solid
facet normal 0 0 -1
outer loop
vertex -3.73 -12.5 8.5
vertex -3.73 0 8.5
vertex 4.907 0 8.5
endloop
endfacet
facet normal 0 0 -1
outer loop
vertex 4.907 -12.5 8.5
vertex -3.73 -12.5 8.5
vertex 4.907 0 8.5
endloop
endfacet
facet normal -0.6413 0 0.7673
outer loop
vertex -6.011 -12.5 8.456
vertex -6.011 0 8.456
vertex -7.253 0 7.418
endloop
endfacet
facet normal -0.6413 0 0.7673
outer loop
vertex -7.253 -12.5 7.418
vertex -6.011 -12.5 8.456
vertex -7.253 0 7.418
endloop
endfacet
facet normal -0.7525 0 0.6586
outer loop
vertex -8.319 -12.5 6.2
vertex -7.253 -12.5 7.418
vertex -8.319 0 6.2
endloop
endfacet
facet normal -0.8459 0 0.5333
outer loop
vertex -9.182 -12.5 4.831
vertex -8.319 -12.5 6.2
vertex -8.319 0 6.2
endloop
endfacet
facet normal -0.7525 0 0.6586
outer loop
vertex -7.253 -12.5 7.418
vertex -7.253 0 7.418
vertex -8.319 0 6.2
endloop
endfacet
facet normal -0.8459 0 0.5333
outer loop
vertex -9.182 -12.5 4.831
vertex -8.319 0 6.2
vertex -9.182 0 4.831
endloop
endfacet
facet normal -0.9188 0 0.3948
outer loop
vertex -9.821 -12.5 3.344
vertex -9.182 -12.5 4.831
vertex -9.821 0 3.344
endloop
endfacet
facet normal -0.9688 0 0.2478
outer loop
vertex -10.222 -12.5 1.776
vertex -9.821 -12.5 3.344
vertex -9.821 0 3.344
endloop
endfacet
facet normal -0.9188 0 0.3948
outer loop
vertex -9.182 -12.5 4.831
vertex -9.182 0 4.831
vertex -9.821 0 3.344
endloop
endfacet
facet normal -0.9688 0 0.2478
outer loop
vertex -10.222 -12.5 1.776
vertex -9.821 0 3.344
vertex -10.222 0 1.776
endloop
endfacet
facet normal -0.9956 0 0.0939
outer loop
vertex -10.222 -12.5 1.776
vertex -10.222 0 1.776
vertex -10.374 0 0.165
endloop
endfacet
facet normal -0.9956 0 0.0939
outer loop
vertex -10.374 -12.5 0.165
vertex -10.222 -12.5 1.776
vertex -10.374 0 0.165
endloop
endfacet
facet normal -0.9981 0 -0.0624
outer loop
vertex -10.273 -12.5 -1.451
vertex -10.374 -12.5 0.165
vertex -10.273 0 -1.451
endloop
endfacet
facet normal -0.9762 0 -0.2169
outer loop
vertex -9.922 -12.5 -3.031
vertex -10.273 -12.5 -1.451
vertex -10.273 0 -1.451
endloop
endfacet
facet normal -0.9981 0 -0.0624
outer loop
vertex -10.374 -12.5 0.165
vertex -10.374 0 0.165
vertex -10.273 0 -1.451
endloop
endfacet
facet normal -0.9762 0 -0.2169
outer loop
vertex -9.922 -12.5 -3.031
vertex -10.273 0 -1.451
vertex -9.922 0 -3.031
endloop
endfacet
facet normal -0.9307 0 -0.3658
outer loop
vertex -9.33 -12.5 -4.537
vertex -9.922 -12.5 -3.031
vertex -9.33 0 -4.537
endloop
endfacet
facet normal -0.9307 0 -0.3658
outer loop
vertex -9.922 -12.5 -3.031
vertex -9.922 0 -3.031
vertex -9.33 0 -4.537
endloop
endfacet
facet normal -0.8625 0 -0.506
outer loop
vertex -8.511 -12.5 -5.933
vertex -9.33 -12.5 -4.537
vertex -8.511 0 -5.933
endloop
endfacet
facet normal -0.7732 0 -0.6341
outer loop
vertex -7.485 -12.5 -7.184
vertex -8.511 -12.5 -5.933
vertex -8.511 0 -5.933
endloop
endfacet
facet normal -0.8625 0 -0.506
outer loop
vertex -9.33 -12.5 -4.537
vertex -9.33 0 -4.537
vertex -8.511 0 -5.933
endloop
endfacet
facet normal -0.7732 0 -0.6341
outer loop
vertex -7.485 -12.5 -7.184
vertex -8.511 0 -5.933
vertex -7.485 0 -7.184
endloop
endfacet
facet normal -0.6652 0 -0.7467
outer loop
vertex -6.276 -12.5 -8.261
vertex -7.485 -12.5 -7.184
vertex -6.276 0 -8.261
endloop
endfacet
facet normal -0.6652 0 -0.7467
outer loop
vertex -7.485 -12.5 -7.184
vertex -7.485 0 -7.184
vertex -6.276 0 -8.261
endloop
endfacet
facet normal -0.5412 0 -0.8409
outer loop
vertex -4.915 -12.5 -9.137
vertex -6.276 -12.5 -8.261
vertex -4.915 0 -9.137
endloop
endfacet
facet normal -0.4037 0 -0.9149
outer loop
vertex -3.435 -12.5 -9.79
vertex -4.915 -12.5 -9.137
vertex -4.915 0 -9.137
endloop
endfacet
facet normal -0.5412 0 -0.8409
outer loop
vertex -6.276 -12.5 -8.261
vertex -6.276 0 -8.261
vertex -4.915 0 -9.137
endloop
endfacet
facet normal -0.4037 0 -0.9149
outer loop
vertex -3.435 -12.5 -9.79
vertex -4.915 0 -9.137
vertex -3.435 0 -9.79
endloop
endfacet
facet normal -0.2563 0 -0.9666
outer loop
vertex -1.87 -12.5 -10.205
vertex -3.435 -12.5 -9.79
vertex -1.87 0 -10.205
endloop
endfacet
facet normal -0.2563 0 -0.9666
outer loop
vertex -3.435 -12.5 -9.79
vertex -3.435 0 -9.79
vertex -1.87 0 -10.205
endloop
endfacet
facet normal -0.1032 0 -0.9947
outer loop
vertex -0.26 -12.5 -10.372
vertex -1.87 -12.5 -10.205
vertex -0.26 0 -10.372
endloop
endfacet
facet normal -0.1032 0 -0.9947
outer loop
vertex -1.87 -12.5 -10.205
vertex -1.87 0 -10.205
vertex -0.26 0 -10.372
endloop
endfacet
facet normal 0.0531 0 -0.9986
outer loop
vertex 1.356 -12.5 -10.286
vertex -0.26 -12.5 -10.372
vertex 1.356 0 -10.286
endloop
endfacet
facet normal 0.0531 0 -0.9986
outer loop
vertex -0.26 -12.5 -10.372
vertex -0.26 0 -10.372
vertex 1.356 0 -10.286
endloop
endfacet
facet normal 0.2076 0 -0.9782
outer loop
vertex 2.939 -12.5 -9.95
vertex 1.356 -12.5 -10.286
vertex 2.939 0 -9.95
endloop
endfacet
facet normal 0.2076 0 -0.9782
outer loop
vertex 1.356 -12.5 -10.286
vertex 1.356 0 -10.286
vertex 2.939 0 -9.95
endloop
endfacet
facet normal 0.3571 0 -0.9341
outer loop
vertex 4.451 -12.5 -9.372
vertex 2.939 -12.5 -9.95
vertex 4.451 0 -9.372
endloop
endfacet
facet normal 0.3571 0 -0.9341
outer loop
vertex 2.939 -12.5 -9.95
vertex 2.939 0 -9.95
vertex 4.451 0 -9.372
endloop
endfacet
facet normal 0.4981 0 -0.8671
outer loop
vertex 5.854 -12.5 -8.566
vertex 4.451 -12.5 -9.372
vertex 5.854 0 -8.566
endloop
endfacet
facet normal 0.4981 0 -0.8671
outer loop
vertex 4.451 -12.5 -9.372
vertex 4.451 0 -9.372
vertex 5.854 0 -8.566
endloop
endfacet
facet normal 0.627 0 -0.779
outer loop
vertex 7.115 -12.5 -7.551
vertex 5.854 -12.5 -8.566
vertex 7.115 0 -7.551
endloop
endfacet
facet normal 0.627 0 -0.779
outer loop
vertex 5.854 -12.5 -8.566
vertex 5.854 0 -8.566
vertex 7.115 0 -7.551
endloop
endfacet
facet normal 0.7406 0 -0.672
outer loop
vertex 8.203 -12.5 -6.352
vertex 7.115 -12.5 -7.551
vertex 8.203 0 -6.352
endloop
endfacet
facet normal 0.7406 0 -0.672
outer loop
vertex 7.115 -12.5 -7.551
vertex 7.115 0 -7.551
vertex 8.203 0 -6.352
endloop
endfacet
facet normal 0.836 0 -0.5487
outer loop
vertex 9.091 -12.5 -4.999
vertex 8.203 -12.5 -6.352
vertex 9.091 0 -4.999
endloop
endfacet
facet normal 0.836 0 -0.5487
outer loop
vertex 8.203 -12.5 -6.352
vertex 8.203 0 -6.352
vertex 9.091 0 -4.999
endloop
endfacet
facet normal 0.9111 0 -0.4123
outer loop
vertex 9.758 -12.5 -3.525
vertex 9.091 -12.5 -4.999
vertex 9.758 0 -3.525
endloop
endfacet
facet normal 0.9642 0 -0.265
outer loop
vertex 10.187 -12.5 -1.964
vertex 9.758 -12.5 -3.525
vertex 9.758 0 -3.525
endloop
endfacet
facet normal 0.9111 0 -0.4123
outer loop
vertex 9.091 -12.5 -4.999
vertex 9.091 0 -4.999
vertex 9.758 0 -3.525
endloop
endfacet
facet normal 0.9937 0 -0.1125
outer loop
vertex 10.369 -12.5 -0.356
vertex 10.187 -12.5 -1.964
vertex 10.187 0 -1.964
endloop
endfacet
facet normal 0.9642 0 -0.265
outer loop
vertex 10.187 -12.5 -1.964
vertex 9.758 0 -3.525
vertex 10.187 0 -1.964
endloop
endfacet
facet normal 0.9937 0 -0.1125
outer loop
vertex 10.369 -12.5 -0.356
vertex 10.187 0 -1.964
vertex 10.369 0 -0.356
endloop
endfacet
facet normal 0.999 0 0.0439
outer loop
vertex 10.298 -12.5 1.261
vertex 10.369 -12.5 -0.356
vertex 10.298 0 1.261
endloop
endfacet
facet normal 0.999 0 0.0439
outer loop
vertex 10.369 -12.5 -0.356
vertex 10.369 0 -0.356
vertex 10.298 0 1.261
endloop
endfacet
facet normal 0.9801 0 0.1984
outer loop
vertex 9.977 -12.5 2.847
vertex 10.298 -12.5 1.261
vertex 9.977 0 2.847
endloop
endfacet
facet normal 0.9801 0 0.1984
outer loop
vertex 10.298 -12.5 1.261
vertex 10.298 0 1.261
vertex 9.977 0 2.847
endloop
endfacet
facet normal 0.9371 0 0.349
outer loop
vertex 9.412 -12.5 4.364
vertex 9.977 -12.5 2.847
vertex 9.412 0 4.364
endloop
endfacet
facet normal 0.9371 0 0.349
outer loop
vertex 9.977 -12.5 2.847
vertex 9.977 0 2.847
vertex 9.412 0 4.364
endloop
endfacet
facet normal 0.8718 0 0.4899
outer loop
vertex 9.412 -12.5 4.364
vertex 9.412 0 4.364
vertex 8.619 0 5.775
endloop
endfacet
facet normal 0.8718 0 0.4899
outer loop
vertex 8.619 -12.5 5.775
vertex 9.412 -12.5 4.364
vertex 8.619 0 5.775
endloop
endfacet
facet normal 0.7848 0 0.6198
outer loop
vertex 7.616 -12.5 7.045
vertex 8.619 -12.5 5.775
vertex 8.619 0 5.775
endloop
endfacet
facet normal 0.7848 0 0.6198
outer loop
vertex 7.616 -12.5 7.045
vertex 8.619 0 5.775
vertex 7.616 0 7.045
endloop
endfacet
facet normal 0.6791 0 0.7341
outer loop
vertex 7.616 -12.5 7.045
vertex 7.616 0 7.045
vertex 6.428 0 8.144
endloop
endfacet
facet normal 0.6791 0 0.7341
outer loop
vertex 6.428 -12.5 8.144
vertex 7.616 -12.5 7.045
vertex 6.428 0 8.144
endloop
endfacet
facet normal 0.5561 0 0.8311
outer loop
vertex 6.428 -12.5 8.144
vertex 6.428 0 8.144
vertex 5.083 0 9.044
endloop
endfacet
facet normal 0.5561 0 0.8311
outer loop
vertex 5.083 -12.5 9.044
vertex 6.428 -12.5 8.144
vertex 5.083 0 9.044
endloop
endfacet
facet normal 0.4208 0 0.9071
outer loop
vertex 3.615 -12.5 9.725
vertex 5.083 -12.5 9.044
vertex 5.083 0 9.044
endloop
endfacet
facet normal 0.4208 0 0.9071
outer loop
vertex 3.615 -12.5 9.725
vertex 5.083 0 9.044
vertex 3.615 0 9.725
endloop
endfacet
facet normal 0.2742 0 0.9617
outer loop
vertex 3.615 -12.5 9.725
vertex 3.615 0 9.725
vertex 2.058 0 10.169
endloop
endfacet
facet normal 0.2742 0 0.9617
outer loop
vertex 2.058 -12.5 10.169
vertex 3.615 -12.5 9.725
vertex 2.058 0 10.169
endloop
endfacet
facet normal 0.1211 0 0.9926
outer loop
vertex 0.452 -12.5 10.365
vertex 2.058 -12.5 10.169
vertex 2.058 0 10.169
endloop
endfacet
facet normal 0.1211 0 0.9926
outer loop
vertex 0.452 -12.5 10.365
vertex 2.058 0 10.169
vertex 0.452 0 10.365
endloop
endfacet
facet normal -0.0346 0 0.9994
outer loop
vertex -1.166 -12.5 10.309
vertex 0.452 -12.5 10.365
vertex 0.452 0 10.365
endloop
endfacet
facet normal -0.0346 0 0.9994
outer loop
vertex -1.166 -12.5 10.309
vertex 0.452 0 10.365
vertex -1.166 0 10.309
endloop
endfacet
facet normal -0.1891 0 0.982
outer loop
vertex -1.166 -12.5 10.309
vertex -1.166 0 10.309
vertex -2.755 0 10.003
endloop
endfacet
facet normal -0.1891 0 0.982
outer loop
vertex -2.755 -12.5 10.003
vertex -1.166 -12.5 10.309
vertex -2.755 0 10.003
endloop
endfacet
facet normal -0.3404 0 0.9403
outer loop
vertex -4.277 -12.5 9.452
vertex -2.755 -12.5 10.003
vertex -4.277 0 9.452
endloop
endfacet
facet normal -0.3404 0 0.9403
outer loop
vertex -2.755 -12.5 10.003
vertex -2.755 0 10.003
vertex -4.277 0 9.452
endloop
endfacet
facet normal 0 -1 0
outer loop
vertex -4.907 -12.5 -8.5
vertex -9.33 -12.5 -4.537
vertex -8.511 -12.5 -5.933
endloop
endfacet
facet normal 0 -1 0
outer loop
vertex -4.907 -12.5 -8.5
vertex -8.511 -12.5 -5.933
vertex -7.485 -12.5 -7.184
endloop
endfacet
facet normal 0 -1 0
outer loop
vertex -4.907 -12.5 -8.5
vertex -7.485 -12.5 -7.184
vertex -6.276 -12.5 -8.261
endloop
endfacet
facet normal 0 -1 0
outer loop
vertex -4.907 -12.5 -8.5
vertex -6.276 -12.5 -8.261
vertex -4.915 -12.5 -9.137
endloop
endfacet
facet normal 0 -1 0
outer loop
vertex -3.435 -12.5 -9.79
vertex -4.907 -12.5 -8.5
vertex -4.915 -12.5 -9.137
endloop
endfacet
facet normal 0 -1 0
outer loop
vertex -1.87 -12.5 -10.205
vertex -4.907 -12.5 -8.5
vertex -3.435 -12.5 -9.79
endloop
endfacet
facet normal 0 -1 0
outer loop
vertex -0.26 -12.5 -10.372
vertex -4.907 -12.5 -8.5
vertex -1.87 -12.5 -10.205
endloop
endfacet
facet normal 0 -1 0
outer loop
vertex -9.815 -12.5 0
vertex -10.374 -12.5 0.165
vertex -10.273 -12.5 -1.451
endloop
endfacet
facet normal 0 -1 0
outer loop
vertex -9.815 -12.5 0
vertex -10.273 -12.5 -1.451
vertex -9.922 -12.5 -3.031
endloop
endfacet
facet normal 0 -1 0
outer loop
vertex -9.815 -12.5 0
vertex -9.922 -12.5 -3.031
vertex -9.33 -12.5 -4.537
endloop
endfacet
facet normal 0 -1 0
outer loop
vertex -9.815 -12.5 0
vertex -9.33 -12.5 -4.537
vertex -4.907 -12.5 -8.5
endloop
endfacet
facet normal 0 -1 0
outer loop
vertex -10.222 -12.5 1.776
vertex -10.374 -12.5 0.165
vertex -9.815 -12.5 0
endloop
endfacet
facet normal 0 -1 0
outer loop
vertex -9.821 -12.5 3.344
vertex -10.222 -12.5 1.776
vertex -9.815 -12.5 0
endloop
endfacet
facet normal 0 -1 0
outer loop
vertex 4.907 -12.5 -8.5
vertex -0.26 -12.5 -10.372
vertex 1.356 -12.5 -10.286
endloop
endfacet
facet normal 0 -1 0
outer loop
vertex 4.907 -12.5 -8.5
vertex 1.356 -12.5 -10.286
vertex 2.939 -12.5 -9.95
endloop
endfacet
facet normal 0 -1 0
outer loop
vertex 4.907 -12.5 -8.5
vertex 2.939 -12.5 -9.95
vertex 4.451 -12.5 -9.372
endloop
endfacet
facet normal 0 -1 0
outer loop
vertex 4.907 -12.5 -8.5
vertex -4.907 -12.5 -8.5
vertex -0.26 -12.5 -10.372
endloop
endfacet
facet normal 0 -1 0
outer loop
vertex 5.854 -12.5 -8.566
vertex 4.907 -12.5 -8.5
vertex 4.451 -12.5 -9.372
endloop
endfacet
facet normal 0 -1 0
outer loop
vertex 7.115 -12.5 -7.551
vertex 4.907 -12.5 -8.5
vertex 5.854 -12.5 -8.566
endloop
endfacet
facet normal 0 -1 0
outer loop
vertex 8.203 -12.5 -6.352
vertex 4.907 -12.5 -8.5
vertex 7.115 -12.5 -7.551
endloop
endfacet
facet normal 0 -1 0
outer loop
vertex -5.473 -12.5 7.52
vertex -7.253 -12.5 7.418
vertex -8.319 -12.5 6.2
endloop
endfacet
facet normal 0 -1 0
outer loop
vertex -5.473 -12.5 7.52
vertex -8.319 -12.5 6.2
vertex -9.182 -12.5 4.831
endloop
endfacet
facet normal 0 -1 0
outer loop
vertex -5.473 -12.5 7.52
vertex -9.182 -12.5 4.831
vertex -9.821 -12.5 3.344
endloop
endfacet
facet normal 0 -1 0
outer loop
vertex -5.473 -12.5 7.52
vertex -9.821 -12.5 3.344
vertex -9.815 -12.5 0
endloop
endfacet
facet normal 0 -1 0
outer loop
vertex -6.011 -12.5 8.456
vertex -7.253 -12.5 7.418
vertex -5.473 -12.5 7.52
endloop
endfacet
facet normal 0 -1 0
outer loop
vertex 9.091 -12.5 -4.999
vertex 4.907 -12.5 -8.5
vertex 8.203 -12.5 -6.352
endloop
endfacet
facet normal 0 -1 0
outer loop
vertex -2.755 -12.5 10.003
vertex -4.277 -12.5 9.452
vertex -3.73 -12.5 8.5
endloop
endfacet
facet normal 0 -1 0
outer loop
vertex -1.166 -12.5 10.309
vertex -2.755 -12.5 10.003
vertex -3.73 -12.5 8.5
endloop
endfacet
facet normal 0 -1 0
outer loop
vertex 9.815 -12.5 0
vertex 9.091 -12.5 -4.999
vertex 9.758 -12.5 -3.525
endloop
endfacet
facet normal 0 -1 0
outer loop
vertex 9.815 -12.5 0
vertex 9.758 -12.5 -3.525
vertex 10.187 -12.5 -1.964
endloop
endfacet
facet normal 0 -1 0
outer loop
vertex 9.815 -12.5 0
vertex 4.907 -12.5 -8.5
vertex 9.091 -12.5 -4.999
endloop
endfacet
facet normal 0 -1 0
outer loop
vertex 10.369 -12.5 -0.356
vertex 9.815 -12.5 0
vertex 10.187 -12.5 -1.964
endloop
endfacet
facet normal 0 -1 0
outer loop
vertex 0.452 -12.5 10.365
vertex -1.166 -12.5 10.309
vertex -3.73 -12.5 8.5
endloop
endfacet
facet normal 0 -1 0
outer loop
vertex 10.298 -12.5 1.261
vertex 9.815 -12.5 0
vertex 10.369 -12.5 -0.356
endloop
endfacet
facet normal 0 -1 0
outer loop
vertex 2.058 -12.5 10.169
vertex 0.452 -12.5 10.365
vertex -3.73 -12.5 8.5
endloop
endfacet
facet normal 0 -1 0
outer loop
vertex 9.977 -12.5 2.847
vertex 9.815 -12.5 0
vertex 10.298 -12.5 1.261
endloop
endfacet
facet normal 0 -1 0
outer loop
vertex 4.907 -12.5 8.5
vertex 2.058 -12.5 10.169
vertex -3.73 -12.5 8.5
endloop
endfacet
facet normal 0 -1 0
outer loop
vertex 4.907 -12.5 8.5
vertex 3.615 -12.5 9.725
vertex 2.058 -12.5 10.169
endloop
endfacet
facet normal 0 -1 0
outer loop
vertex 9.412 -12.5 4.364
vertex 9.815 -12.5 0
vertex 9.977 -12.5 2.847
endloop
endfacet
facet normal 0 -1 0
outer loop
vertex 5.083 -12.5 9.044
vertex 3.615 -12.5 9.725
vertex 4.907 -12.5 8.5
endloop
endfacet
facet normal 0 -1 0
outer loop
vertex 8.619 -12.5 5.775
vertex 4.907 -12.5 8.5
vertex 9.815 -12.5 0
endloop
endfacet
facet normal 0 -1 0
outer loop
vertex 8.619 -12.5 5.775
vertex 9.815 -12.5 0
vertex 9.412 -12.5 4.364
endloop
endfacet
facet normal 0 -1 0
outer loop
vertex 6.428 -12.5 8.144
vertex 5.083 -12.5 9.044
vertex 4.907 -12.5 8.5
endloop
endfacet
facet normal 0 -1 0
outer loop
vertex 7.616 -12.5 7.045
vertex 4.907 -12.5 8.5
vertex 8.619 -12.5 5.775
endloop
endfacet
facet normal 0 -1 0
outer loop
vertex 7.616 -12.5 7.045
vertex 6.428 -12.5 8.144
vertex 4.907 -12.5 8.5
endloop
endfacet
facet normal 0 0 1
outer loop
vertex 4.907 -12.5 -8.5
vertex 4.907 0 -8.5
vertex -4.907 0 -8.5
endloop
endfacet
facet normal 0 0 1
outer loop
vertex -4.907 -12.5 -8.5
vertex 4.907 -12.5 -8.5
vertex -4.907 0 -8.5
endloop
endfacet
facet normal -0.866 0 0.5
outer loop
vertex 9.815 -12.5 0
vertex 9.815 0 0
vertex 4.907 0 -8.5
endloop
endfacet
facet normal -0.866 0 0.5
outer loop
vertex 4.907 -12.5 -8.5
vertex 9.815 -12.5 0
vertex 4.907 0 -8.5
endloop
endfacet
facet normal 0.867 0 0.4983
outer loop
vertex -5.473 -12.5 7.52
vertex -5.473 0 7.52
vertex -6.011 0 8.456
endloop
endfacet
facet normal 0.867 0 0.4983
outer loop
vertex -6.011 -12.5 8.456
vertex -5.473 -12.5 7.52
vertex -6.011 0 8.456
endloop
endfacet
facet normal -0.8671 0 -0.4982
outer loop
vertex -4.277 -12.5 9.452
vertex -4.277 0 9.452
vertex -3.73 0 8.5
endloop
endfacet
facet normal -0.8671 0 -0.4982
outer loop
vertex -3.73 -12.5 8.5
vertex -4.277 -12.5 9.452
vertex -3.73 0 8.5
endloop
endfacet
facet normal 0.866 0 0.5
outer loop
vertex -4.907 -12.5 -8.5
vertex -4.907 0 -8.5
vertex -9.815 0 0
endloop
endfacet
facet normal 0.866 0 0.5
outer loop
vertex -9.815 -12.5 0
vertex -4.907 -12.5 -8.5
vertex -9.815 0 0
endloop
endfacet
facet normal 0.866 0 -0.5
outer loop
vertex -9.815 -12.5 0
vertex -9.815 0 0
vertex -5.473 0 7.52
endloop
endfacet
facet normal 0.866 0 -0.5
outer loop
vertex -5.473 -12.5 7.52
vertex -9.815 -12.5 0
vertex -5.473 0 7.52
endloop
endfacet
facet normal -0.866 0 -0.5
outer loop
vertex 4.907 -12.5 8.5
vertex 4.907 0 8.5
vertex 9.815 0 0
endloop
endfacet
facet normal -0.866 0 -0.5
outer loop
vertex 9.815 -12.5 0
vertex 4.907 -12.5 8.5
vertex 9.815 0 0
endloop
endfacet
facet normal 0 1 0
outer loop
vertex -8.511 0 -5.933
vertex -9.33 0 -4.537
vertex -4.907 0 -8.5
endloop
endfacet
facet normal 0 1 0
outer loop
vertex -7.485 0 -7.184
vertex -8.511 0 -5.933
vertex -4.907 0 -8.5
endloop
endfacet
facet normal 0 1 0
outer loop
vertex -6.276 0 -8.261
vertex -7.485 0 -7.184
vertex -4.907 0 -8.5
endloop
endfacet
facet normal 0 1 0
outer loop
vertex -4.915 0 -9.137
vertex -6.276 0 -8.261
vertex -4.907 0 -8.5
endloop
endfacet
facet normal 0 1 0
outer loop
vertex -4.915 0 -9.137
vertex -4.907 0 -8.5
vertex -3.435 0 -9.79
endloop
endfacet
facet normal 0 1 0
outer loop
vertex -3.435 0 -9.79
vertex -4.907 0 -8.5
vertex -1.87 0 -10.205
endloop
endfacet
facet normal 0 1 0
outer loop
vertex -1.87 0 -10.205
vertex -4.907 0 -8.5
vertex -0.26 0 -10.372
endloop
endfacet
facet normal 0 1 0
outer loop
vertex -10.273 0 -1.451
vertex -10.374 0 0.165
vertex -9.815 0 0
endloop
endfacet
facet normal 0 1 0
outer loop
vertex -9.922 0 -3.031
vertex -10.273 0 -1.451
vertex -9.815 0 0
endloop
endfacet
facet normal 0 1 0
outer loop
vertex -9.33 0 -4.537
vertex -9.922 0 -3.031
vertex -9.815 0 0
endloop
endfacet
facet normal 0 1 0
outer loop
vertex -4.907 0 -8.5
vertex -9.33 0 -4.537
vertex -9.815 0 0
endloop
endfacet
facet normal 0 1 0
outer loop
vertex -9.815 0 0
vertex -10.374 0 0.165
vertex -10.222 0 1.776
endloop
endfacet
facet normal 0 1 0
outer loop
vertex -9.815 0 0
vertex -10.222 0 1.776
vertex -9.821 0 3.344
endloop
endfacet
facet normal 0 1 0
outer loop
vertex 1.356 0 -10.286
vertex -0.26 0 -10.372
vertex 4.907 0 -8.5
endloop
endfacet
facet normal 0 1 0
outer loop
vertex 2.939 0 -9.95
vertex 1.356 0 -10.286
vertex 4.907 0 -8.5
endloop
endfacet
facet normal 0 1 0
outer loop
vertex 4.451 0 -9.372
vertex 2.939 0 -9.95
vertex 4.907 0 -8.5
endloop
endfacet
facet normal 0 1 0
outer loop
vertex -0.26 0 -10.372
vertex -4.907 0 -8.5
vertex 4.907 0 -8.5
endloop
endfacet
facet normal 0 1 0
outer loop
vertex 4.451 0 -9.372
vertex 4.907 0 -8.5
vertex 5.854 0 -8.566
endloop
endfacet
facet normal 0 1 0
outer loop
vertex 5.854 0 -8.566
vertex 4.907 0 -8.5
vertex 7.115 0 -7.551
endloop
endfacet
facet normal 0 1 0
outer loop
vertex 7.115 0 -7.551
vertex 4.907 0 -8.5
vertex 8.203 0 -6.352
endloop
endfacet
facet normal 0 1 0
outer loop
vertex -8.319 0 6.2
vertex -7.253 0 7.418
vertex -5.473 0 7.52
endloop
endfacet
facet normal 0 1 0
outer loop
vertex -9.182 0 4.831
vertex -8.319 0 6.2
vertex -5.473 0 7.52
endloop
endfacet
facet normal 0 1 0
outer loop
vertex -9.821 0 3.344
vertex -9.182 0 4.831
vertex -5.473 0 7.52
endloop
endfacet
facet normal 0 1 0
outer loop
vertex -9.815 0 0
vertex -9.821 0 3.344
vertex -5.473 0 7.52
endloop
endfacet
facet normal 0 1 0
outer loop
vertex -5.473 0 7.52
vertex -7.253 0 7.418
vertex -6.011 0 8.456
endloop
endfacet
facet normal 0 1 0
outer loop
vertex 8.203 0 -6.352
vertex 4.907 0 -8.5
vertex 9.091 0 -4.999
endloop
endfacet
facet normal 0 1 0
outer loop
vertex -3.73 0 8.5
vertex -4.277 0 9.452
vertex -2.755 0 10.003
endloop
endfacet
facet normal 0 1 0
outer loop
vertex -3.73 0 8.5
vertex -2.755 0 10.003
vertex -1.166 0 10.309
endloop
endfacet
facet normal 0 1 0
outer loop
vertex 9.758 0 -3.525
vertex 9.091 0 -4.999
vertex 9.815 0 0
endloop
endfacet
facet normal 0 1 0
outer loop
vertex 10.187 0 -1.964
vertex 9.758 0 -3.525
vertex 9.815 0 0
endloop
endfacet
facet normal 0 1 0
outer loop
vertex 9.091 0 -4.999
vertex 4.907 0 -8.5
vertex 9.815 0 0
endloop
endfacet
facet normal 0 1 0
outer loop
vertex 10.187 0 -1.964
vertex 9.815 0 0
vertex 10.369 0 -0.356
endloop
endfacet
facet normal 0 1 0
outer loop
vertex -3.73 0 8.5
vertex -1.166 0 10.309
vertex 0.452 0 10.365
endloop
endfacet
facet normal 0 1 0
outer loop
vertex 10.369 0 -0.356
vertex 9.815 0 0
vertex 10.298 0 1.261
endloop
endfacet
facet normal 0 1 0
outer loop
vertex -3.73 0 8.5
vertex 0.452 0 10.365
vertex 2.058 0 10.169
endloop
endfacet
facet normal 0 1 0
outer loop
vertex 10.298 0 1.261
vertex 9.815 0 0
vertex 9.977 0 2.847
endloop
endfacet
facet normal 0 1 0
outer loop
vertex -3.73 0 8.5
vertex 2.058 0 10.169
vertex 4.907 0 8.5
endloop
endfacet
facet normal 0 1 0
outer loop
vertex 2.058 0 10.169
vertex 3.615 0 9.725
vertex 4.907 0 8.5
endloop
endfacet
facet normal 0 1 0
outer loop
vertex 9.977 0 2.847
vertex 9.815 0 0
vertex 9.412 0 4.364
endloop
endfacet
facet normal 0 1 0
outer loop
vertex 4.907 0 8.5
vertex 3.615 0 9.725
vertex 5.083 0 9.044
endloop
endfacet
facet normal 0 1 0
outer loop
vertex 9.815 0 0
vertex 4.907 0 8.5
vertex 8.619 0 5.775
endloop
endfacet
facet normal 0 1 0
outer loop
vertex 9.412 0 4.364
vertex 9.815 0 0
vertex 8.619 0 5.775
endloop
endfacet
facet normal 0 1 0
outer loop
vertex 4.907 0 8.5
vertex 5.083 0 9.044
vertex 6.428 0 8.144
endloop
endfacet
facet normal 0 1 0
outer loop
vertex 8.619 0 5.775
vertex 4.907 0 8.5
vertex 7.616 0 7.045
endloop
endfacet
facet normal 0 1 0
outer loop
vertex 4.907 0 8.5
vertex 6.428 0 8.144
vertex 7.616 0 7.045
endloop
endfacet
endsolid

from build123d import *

# Parameters (mm, degrees)
F1_DEPTH = 12.5


with BuildPart() as f1:
    # F0 (on Front) → F1 (new body)
    with BuildSketch(Plane.XZ):
        with BuildLine():
            Line((4.907477, 8.5), (9.814955, 0))
            Line((9.814955, 0), (4.907477, -8.5))
            Line((4.907477, -8.5), (-4.907477, -8.5))
            Line((-4.907477, -8.5), (-9.814955, 0))
            Line((-9.814955, 0), (-5.47339, 7.51981))
            Line((-5.47339, 7.51981), (-6.011273, 8.456076))
            ThreePointArc((-6.011273, 8.456076), (5.168242, -8.996105), (-4.277084, 9.452363))
            Line((-4.277084, 9.452363), (-3.729954, 8.5))
            Line((-3.729954, 8.5), (4.907477, 8.5))
        make_face()
    extrude(amount=F1_DEPTH)


solid = f1.part
